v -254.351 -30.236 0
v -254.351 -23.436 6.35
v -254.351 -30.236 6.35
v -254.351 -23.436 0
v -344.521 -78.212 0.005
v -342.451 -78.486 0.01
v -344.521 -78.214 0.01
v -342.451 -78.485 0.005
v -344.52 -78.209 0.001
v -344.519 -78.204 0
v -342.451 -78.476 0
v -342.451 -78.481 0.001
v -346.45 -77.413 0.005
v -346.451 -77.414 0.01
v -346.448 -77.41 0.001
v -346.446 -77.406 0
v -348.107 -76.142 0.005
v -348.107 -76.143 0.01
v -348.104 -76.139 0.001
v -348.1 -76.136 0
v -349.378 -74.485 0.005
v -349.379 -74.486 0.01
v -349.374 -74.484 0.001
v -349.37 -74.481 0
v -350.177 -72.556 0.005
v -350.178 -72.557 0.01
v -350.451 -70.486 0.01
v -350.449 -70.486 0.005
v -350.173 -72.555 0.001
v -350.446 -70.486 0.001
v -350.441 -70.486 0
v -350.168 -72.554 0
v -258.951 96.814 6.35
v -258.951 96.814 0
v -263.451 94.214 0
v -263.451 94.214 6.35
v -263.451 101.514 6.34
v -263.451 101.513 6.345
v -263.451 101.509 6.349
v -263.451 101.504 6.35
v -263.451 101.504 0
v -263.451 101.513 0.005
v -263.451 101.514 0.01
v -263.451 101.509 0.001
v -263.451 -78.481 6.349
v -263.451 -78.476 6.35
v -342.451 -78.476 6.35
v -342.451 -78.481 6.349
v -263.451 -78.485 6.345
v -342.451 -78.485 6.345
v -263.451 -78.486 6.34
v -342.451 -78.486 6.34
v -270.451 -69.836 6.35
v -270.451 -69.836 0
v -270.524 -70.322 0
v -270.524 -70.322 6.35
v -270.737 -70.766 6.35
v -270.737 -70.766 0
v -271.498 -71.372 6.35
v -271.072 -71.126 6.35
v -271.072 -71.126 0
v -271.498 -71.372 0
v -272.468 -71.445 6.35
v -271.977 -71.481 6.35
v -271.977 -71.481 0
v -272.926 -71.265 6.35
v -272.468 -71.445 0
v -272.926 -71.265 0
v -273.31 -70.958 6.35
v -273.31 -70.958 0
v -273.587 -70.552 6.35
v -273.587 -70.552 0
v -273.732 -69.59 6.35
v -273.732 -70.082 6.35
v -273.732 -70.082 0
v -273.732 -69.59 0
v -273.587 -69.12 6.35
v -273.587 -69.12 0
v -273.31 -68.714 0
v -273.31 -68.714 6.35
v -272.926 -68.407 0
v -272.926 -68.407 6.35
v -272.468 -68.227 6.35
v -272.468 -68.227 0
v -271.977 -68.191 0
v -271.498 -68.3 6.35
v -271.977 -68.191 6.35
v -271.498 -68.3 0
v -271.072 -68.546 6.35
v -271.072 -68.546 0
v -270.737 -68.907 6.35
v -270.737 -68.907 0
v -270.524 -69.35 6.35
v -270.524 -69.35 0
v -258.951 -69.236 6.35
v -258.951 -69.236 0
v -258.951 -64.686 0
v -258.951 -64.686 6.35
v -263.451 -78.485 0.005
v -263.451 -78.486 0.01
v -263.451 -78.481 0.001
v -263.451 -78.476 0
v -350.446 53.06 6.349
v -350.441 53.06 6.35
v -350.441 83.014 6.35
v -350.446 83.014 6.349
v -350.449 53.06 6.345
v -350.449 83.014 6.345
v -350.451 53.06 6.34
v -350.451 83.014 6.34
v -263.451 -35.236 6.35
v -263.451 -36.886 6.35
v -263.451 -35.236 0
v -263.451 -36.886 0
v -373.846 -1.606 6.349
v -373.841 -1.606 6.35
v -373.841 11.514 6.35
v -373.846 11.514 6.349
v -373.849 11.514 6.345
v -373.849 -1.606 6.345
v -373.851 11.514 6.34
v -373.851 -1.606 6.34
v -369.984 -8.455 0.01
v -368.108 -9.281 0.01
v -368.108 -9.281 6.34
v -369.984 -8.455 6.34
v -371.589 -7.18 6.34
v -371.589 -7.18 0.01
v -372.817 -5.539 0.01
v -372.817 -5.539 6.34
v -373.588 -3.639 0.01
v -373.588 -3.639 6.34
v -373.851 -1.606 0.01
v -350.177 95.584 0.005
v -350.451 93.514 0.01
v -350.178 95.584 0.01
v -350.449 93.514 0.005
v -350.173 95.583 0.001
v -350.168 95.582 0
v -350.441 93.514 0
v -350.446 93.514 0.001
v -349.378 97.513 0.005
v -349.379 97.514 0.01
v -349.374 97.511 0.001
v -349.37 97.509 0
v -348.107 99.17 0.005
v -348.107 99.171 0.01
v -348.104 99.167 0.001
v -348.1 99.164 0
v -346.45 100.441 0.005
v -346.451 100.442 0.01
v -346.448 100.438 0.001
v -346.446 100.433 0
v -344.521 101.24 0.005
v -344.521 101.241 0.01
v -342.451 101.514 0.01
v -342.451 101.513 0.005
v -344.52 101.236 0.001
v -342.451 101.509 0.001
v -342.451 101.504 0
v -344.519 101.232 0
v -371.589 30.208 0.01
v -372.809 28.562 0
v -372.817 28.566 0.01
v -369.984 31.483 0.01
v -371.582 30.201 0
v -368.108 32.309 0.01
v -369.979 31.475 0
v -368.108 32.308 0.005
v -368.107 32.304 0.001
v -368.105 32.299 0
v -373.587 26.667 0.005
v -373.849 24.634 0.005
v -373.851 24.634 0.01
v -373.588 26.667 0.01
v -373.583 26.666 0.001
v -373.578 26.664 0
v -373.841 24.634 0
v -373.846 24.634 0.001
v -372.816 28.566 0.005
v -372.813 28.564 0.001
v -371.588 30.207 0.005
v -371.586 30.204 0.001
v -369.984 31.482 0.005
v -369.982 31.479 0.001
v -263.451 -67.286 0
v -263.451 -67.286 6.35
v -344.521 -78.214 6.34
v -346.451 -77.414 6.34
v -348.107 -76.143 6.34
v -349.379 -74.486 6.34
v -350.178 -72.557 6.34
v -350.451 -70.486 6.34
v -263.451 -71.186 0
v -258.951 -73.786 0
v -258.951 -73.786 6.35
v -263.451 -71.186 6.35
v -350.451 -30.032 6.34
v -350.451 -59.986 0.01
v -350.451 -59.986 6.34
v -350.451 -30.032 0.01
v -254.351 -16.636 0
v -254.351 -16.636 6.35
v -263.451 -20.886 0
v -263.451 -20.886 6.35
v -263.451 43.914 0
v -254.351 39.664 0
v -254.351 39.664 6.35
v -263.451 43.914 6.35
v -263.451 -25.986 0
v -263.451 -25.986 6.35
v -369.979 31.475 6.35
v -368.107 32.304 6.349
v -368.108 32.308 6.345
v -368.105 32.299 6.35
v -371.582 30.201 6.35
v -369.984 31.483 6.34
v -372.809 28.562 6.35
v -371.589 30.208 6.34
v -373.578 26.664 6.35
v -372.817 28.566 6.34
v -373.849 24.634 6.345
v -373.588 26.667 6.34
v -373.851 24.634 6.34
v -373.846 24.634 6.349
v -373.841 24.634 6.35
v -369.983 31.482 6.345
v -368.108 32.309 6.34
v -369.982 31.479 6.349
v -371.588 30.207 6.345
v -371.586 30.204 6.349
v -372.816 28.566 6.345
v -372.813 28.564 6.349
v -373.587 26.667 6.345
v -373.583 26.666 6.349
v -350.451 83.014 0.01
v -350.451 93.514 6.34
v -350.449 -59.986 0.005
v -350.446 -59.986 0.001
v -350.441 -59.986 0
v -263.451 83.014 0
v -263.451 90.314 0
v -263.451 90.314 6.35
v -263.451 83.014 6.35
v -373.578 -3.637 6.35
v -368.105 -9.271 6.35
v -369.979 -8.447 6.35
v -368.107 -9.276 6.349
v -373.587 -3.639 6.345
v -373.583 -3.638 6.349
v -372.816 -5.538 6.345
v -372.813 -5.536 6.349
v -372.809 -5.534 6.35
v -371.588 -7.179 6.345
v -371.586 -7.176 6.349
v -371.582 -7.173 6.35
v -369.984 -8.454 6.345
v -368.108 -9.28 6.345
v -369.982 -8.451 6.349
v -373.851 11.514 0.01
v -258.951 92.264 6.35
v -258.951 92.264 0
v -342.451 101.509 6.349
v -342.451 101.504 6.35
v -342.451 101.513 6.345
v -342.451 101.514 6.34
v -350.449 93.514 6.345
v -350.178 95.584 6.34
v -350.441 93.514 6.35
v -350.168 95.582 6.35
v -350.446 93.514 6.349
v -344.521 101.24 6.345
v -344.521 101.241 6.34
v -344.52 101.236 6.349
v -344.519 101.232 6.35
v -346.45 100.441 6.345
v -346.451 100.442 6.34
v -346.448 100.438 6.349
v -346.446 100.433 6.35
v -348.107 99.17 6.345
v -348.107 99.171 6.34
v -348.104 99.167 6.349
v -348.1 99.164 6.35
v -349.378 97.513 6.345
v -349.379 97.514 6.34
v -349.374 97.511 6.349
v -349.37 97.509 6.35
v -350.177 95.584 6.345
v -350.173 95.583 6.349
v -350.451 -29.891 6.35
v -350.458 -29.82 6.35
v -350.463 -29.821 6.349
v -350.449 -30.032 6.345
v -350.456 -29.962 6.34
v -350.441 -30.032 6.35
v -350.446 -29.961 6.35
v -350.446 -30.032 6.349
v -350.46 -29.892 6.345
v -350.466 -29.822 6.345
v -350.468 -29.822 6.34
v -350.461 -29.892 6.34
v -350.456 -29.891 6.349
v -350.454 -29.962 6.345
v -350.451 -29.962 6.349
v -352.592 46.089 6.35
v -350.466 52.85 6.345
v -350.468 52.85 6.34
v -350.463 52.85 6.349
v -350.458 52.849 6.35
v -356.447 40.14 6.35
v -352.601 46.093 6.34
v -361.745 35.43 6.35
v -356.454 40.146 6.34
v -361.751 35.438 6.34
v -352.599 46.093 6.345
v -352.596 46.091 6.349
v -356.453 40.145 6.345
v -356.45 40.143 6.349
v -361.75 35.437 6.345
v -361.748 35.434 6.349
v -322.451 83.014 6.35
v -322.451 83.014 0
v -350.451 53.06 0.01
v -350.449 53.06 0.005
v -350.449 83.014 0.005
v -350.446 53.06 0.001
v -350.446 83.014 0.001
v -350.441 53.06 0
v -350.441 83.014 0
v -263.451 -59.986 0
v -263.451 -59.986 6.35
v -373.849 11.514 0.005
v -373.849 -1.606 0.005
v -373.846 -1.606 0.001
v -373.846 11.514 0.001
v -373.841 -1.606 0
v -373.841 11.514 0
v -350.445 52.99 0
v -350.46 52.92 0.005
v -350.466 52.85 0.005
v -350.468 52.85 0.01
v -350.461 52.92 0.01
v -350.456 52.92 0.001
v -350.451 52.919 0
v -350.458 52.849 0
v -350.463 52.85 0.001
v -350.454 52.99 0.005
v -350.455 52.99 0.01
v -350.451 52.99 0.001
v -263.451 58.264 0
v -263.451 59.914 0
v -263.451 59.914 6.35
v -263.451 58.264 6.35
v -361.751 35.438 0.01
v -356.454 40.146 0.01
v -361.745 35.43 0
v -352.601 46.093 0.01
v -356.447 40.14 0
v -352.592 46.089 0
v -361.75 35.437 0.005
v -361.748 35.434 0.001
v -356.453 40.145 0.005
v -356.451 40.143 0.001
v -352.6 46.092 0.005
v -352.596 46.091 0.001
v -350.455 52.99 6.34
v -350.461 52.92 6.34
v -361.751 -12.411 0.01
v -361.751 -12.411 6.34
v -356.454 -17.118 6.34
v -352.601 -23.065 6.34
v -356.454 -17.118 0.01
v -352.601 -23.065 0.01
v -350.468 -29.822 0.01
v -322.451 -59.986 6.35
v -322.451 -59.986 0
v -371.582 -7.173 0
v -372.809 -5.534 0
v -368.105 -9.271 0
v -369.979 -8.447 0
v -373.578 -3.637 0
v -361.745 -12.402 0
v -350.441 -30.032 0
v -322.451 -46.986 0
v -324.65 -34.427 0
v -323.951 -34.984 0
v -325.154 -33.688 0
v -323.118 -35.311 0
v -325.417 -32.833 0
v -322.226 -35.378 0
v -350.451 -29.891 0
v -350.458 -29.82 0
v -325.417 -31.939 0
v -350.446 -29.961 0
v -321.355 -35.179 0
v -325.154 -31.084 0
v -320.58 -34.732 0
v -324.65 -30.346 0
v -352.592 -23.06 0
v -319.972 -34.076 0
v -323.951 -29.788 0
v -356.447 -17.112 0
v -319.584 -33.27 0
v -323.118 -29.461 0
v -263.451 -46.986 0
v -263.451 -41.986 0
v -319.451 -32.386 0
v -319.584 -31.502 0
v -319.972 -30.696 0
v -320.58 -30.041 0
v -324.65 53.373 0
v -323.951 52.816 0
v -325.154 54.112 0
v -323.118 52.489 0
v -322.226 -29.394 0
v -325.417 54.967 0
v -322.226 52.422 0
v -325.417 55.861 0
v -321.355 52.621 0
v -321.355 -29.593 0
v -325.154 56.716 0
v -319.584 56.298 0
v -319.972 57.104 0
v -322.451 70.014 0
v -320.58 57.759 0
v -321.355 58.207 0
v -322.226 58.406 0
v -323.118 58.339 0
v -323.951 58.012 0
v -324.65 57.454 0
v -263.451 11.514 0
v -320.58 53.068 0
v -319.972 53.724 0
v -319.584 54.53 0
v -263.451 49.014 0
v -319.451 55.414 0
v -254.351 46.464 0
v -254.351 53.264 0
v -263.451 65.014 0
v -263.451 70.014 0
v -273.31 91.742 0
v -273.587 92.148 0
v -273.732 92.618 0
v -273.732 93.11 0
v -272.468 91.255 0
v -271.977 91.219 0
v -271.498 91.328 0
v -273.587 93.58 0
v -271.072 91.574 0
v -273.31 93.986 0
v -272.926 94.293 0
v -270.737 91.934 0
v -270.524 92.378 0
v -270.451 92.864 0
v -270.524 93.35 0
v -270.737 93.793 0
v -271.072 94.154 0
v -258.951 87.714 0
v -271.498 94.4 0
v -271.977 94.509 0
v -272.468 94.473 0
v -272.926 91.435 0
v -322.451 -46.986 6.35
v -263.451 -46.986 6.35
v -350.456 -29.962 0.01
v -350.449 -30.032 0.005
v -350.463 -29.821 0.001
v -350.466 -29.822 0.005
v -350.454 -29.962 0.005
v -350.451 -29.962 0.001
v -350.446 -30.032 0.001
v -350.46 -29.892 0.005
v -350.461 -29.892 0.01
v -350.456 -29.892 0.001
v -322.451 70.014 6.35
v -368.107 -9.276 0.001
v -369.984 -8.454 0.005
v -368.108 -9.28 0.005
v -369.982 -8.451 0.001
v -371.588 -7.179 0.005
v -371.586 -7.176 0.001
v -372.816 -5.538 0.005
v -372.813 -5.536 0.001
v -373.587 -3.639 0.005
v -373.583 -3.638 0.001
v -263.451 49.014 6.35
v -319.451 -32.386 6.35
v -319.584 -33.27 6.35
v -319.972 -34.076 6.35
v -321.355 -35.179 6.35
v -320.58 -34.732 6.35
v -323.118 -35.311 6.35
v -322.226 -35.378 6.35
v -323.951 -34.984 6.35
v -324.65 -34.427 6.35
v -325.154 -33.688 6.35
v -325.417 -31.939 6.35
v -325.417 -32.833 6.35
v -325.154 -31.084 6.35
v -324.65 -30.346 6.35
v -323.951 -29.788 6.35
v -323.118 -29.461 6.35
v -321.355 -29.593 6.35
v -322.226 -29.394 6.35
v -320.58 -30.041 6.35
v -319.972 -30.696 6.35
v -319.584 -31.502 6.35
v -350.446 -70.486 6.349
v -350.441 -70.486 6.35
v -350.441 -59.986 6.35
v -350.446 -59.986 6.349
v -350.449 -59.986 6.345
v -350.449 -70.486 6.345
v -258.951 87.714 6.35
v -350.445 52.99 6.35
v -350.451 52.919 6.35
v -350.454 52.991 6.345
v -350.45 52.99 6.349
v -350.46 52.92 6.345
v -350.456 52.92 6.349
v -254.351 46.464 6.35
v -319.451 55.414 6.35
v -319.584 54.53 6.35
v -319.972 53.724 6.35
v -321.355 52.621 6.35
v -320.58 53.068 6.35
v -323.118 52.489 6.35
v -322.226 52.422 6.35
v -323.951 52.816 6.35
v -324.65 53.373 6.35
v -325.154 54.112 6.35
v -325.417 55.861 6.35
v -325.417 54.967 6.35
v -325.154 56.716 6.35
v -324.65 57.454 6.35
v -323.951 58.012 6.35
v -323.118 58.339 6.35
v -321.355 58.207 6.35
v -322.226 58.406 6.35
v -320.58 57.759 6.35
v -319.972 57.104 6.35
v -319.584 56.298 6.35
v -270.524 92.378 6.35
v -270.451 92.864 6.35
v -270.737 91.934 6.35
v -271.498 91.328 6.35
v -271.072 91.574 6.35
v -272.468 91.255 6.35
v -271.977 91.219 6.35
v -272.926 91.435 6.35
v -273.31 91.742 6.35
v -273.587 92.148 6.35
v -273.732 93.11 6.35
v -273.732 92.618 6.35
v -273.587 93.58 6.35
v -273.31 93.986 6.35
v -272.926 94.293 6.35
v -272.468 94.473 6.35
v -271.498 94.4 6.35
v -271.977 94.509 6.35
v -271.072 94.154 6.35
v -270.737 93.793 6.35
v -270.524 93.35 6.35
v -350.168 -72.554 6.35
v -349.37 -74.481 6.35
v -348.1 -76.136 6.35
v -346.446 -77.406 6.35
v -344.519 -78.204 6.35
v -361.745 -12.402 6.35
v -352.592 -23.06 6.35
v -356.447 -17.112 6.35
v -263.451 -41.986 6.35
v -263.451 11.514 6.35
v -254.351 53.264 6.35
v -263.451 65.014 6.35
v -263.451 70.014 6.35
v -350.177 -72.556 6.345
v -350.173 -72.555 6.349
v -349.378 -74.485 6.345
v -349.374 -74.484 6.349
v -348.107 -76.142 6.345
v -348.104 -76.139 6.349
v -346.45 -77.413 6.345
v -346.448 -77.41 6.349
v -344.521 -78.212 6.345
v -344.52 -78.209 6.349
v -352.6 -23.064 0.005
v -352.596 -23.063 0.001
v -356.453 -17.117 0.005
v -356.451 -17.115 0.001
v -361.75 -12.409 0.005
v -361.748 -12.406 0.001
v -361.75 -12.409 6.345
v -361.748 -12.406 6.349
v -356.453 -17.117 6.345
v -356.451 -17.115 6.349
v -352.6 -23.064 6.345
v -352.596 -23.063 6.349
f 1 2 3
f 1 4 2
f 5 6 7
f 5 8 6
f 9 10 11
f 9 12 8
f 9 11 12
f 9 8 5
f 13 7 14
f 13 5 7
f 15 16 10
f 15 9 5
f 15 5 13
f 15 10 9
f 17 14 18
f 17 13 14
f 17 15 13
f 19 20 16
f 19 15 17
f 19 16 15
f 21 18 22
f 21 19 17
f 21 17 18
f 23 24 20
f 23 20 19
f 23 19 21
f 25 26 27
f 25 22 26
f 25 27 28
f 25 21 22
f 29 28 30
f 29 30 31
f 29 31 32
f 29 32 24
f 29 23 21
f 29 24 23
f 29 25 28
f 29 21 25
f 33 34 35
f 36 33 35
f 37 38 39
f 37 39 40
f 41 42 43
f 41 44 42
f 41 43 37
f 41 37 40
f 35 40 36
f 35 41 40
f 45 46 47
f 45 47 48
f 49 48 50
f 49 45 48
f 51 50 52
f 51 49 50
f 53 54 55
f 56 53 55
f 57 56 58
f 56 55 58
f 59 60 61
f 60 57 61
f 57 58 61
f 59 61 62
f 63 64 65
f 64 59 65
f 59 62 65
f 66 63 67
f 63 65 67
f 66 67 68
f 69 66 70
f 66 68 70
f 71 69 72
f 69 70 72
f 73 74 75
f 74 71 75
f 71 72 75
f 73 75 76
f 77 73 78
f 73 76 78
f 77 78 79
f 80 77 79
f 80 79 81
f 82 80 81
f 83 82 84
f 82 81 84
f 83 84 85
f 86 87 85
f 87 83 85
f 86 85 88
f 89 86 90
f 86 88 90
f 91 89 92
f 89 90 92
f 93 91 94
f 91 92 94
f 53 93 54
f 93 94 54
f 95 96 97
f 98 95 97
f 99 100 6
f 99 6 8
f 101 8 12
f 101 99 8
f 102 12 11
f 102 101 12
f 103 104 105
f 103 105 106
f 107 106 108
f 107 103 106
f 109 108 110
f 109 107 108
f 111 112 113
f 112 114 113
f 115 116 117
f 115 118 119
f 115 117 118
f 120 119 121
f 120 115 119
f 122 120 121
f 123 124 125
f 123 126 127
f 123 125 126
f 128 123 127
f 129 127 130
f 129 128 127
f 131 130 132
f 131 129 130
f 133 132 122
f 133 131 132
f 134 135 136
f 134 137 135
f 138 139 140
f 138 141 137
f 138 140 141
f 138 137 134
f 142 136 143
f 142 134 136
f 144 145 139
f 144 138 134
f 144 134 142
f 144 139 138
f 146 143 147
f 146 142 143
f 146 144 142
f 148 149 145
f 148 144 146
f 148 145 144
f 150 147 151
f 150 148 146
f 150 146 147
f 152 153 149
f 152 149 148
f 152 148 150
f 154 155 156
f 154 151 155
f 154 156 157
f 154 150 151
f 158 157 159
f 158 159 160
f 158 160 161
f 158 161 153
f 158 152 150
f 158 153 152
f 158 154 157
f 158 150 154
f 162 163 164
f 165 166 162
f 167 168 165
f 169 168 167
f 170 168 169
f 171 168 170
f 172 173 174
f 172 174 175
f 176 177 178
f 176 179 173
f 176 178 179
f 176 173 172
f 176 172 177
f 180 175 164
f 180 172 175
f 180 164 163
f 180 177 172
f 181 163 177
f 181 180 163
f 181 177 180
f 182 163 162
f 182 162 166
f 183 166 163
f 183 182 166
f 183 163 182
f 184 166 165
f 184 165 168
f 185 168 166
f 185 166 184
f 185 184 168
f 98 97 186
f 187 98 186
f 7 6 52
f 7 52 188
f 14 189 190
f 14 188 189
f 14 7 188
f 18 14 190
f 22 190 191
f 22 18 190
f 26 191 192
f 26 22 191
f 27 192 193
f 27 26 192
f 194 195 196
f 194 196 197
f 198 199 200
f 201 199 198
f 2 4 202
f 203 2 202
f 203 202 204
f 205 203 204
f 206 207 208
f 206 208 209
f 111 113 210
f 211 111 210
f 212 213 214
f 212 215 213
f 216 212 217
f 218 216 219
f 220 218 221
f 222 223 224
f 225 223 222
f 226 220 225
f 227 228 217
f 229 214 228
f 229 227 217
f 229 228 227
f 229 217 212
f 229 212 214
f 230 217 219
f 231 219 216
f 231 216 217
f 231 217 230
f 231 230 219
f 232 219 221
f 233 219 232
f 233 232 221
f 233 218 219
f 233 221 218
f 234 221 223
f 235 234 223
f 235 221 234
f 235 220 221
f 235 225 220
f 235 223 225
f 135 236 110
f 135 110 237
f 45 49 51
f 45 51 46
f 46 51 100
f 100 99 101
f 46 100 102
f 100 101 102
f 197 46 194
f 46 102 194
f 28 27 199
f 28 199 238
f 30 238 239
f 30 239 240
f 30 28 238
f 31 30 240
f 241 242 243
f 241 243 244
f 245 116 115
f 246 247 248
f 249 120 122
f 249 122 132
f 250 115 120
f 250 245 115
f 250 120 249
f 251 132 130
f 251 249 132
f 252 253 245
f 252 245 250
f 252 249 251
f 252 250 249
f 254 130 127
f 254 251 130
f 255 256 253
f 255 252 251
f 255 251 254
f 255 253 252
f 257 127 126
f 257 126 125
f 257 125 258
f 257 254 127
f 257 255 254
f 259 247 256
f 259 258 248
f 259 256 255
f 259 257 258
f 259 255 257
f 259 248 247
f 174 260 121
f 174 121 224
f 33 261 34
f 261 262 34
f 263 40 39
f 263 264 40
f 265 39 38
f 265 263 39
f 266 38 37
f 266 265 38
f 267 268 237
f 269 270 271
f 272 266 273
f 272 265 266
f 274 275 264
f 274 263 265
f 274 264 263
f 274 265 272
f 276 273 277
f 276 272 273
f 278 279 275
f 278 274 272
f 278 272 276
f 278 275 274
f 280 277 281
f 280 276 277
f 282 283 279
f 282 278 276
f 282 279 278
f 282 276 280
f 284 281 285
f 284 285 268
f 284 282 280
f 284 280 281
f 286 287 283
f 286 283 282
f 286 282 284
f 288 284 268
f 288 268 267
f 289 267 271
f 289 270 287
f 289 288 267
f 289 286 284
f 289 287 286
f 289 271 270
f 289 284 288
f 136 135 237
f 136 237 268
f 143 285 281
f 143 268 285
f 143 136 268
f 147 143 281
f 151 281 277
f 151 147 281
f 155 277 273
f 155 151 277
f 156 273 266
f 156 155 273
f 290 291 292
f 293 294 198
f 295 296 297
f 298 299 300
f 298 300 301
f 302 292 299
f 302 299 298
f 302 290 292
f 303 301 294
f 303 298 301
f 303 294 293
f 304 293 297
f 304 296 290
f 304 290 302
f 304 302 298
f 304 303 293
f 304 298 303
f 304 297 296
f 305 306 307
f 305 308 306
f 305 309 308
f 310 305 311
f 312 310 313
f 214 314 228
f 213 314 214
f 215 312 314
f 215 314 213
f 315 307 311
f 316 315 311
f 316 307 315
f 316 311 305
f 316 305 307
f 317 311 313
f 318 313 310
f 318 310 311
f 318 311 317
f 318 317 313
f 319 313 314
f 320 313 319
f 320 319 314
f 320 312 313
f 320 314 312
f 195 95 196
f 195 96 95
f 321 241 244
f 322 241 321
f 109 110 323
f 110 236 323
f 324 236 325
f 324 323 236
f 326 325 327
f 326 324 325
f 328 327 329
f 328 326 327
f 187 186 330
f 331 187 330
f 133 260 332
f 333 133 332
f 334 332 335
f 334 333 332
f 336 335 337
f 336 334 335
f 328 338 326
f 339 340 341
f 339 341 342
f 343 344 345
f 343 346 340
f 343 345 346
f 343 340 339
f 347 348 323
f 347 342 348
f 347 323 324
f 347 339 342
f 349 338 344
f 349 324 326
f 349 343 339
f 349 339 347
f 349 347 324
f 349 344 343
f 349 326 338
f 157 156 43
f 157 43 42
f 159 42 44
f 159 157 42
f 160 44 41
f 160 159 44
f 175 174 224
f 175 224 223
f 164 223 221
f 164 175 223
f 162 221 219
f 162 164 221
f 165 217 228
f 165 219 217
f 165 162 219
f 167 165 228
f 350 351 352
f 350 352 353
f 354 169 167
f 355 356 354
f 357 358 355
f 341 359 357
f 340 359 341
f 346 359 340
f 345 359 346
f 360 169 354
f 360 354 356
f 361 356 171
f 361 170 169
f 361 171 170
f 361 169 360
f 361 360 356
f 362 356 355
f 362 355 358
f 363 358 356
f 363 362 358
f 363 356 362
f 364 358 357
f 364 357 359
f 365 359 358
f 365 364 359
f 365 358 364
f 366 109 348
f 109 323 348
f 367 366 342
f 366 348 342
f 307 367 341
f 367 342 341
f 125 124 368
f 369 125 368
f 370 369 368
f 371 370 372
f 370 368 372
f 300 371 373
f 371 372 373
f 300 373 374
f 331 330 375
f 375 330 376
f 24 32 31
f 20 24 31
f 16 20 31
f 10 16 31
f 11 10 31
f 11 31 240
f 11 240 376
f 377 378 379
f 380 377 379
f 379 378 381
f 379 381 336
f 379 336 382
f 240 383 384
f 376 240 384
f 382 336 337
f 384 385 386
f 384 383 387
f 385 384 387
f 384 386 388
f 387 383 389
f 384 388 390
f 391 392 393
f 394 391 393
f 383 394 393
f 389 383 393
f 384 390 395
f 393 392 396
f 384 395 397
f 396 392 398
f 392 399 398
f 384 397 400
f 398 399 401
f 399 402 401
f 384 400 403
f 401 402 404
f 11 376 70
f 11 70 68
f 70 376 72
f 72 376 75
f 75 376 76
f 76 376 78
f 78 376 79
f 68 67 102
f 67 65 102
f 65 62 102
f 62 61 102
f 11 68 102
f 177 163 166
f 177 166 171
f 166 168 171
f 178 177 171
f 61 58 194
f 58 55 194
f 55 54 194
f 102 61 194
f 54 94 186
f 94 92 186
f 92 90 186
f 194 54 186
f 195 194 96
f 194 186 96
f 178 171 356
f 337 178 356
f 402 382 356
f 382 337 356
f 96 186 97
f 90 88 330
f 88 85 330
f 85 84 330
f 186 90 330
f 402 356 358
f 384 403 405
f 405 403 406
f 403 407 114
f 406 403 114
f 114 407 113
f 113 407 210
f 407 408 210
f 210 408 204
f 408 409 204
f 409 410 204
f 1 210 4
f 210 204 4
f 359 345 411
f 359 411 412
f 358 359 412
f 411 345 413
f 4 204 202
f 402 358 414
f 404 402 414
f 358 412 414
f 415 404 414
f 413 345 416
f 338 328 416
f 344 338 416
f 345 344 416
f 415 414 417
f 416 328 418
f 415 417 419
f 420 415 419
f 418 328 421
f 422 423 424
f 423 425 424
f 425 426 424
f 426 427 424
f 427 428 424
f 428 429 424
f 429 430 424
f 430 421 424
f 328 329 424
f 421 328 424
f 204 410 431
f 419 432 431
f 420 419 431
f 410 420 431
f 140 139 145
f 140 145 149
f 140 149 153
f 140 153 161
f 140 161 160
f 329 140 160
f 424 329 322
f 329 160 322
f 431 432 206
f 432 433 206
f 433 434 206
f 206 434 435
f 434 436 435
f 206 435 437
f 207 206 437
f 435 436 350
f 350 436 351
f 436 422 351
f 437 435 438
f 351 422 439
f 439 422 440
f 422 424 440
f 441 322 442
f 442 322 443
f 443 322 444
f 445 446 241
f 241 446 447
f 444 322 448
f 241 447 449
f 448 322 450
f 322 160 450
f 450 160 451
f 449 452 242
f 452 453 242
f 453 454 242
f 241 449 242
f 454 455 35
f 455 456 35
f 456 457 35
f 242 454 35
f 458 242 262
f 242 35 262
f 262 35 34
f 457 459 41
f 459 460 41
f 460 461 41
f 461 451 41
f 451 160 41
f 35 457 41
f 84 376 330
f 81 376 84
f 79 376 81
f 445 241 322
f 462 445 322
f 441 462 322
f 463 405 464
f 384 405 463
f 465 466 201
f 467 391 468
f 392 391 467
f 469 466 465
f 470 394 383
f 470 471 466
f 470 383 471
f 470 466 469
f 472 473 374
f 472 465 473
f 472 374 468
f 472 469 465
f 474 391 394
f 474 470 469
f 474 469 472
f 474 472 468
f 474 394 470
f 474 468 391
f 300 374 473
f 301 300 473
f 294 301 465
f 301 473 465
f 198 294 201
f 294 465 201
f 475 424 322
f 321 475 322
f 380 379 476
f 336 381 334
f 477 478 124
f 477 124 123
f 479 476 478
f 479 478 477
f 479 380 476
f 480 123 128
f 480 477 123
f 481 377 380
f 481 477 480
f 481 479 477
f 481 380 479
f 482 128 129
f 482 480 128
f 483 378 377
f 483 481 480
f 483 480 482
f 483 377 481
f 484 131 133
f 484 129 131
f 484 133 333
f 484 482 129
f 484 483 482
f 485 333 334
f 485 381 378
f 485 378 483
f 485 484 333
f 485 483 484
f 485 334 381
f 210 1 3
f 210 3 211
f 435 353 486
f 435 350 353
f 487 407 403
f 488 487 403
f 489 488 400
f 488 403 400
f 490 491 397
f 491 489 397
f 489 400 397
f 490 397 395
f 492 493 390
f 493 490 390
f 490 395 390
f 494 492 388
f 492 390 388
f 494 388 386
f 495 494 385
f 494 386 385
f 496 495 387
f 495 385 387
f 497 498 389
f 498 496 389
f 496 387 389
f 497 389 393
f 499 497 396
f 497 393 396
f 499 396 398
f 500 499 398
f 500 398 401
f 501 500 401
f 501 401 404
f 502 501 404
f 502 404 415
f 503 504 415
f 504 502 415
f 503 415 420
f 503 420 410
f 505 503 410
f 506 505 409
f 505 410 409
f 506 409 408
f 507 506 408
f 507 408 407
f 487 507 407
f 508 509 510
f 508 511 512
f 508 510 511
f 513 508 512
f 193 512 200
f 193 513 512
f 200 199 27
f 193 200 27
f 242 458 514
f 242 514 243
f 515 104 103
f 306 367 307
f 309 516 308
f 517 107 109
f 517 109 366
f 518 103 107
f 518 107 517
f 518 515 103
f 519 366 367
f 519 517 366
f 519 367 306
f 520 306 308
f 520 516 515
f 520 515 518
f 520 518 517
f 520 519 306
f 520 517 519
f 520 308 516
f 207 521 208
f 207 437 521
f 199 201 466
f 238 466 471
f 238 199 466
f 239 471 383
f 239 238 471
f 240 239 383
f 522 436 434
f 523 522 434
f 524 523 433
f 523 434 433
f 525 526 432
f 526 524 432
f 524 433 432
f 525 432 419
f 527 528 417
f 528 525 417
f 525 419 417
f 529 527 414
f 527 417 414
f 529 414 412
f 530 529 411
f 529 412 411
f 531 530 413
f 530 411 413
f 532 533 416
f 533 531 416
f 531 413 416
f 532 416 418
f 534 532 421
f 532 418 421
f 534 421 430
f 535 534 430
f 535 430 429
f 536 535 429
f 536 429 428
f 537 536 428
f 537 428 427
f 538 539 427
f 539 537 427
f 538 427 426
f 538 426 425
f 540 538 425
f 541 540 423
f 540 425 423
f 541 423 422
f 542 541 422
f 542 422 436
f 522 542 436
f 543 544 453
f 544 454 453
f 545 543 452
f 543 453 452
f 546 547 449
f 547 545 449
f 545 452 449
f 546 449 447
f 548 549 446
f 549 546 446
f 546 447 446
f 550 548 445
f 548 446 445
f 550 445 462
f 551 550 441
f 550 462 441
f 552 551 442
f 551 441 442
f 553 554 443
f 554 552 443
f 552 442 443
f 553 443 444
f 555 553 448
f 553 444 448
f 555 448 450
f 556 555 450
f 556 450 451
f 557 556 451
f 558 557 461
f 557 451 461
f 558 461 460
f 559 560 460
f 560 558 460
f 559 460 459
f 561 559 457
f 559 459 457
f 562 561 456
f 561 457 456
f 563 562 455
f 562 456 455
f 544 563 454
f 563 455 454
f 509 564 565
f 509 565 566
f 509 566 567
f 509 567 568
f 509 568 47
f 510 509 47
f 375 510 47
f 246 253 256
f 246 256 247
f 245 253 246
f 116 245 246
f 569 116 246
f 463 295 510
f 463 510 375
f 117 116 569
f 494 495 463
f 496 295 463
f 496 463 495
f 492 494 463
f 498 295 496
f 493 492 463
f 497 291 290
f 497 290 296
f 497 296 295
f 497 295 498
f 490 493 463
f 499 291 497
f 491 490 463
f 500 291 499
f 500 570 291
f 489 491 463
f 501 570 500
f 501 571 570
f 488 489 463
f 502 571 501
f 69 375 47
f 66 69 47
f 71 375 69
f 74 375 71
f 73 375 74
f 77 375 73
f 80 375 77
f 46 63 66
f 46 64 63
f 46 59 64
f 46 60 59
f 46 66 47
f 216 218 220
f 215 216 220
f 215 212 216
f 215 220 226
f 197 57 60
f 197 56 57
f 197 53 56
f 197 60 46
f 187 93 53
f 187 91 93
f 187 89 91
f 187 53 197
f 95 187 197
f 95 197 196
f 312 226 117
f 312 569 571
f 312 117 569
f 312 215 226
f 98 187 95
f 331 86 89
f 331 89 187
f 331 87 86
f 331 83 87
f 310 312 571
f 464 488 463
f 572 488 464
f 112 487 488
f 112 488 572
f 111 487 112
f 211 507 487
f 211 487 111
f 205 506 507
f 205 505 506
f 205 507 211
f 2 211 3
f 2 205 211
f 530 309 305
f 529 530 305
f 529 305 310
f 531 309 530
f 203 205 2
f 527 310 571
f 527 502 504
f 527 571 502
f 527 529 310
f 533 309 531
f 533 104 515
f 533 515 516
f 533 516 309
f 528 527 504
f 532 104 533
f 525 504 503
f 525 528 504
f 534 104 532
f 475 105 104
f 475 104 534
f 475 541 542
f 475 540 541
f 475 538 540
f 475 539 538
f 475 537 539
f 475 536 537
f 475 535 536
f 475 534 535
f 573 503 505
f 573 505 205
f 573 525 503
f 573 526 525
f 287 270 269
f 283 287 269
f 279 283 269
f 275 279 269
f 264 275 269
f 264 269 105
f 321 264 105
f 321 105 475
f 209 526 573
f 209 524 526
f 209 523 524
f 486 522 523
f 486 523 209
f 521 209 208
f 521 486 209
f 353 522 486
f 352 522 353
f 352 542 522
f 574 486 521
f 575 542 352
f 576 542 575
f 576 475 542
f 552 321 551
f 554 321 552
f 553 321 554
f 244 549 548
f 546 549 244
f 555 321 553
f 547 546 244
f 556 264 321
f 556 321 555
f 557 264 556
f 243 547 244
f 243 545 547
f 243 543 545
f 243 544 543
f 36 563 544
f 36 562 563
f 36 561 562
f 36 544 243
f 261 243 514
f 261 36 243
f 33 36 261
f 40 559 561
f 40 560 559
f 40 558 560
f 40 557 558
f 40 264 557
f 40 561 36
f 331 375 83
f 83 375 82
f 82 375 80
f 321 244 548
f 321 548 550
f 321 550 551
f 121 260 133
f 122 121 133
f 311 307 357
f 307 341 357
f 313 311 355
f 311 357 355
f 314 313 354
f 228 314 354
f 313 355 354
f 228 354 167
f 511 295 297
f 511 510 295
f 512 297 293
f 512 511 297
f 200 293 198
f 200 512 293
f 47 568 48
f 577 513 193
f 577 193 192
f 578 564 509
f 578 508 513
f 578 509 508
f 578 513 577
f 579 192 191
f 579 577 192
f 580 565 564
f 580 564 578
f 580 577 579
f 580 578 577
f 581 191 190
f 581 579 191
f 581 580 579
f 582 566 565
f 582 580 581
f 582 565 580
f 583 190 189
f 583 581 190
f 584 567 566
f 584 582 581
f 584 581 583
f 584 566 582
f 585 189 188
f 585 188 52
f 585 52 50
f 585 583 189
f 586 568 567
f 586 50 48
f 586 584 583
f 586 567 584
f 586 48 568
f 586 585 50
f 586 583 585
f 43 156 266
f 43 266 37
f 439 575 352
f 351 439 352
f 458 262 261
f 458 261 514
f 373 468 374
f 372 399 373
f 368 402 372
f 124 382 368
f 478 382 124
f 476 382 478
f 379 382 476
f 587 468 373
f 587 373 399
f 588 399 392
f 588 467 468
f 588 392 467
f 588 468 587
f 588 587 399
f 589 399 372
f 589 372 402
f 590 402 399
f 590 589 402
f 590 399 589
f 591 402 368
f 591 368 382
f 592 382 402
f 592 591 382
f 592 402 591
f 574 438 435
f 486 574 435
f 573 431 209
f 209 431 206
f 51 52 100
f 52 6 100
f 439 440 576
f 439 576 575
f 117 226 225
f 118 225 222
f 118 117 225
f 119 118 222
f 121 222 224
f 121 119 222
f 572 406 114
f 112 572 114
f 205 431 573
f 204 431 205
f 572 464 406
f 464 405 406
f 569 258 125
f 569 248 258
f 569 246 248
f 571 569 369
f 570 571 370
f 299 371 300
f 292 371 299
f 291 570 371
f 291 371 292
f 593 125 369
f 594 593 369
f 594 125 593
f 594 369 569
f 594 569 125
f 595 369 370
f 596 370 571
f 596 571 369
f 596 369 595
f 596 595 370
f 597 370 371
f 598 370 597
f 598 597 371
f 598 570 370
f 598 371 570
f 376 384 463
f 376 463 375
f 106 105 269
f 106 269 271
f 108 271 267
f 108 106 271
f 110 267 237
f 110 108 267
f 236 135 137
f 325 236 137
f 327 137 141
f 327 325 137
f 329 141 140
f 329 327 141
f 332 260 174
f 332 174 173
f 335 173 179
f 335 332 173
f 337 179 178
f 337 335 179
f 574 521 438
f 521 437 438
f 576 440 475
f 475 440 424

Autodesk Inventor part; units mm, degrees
ref_plane "YZ Plane" through (0, 0, 0) normal (1, 0, 0) x (0, 1, 0)
ref_plane "XZ Plane" through (0, 0, 0) normal (0, 1, 0) x (-1, 0, 0)
ref_plane "XY Plane" through (0, 0, 0) normal (0, 0, 1) x (1, 0, 0)
sketch "Boceto1" plane through (0, 0, 0) normal (0, 0, 1) x (1, 0, 0)
  line L0 (0, 71.5) -> (84.4, 71.5)
  line L1 (0, 0) -> (4.5, 0)
  line L2 (62.2, 0) -> (62.2, 35)
  line L3 (62.2, 35) -> (112.2, 35)
  line L4 (112.2, 35) -> (112.2, 0)
  line L5 (84.4, 58.5) -> (84.4, 71.5)
  line L6 (84.4, 58.5) -> (0, 58.5)
  line L7 (87.2, 35) -> (108.2, 35)
  circle A0 centre (108.2, 46.75) radius 1.65
  circle A1 centre (66.2, 46.75) radius 1.65
  circle A2 centre (31.1, 43.75) radius 3
  circle A3 centre (178.7, 0) radius 2.5
  circle A4 centre (68.5, 81.35) radius 1.65
  line L8 (0, 90) -> (105.7, 90)
  arc A5 (120.7782, 83.1308) -> (105.7, 90) centre (105.672, 69.9553) ccw
  line L9 (200, 0) -> (200, 30.4)
  arc A6 (200, 30.4) -> (192, 38.4) centre (192, 30.4) ccw
  arc A7 (120.7782, 83.1308) -> (192, 38.4) centre (202.3119, 133.8853) ccw
  line L10 (4.5, 80.75) -> (4.5, 85.3)
  line L11 (4.5, 85.3) -> (0, 82.7)
  line L12 (4.5, 80.75) -> (4.5, 76.2)
  line L13 (4.5, 76.2) -> (0, 78.8)
  line L14 (0, 90) -> (0, 82.7)
  line L15 (0, 58.5) -> (0, 53.5)
  line L16 (0, 48.4) -> (0, 46.75)
  line L17 (0, 78.8) -> (0, 71.5)
  line L18 (0, 58.5) -> (0, 53.5)
  line L19 (0, 53.5) -> (0, 48.4)
  line L20 (0, 58.5) -> (0, 37.5)
  line L21 (9.1, 34.95) -> (9.1, 41.75)
  line L22 (9.1, 41.75) -> (0, 37.5)
  line L23 (9.1, 34.95) -> (9.1, 28.15)
  line L24 (9.1, 28.15) -> (0, 32.4)
  line L25 (0, 0) -> (0, 32.4)
  line L26 (0, 37.5) -> (0, 46.75)
  line L27 (0, -71.5) -> (84.4, -71.5)
  line L28 (62.2, 0) -> (62.2, -35)
  line L29 (62.2, -35) -> (112.2, -35)
  line L30 (112.2, -35) -> (112.2, 0)
  line L31 (84.4, -58.5) -> (84.4, -71.5)
  line L32 (84.4, -58.5) -> (0, -58.5)
  line L33 (87.2, -35) -> (108.2, -35)
  circle A8 centre (108.2, -46.75) radius 1.65
  circle A9 centre (66.2, -46.75) radius 1.65
  circle A10 centre (31.1, -43.75) radius 3
  circle A11 centre (178.7, 0) radius 2.5
  circle A12 centre (68.5, -81.35) radius 1.65
  line L34 (0, -90) -> (105.7, -90)
  arc A13 (105.7, -90) -> (120.7782, -83.1308) centre (105.672, -69.9553) ccw
  line L35 (200, 0) -> (200, -30.4)
  arc A14 (192, -38.4) -> (200, -30.4) centre (192, -30.4) ccw
  arc A15 (192, -38.4) -> (120.7782, -83.1308) centre (202.3119, -133.8853) ccw
  line L36 (4.5, -80.75) -> (4.5, -85.3)
  line L37 (4.5, -85.3) -> (0, -82.7)
  line L38 (4.5, -80.75) -> (4.5, -76.2)
  line L39 (4.5, -76.2) -> (0, -78.8)
  line L40 (0, -90) -> (0, -82.7)
  line L41 (0, -58.5) -> (0, -53.5)
  line L42 (0, -48.4) -> (0, -46.75)
  line L43 (0, -78.8) -> (0, -71.5)
  line L44 (0, -58.5) -> (0, -53.5)
  line L45 (0, -53.5) -> (0, -48.4)
  line L46 (0, -58.5) -> (0, -37.5)
  line L47 (9.1, -34.95) -> (9.1, -41.75)
  line L48 (9.1, -41.75) -> (0, -37.5)
  line L49 (9.1, -34.95) -> (9.1, -28.15)
  line L50 (9.1, -28.15) -> (0, -32.4)
  line L51 (0, 0) -> (0, -32.4)
  line L52 (0, -37.5) -> (0, -46.75)
  line L53 (261.8168, 58.5) -> (321.3628, 58.5)
  line L54 (321.3628, 58.5) -> (321.3628, -17.5)
  line L55 (321.3628, -17.5) -> (261.8168, -17.5)
  line L56 (261.8168, -17.5) -> (261.8168, 58.5)
sketch "Boceto3" plane through (0, 0, 0) normal (0, 0, 1) x (1, 0, 0)
  line L0 (-258.9506, 92.2639) -> (-258.9506, 96.8139)
  line L1 (-258.9506, 96.8139) -> (-263.4506, 94.2139)
  line L2 (-258.9506, 92.2639) -> (-258.9506, 87.7139)
  line L3 (-258.9506, 87.7139) -> (-263.4506, 90.3139)
  line L4 (-263.4506, 101.5139) -> (-263.4506, 94.2139)
  line L5 (-263.4506, 70.0139) -> (-263.4506, 65.0139)
  line L6 (-263.4506, 59.9139) -> (-263.4506, 58.2639)
  line L7 (-263.4506, 90.3139) -> (-263.4506, 83.0139)
  line L8 (-263.4506, 70.0139) -> (-263.4506, 65.0139)
  line L9 (-263.4506, 65.0139) -> (-263.4506, 59.9139)
  line L10 (-263.4506, 70.0139) -> (-263.4506, 49.0139)
  line L11 (-254.3506, 46.4639) -> (-254.3506, 53.2639)
  line L12 (-254.3506, 53.2639) -> (-263.4506, 49.0139)
  line L13 (-254.3506, 46.4639) -> (-254.3506, 39.6639)
  line L14 (-254.3506, 39.6639) -> (-263.4506, 43.9139)
  line L15 (-263.4506, 11.5139) -> (-263.4506, 43.9139)
  line L16 (-263.4506, 49.0139) -> (-263.4506, 58.2639)
  line L17 (-263.4506, 83.0139) -> (-322.4506, 83.0139)
  line L18 (-263.4506, 83.0139) -> (-322.4506, 83.0139)
  line L19 (-263.4506, 70.0139) -> (-322.4506, 70.0139)
  line L20 (-322.4506, 70.0139) -> (-322.4506, 83.0139)
  circle A0 centre (-322.4506, 55.4139) radius 3
  line L21 (-350.4506, 83.0139) -> (-350.4506, 93.5139)
  circle A1 centre (-272.1006, 92.8639) radius 1.65
  line L22 (-342.4506, 101.5139) -> (-263.4506, 101.5139)
  line L23 (-373.8506, 11.5139) -> (-373.8506, 24.6339)
  arc A2 (-368.1081, 32.3088) -> (-373.8506, 24.6339) centre (-365.8506, 24.6339) ccw
  arc A3 (-342.4506, 101.5139) -> (-350.4506, 93.5139) centre (-342.4506, 93.5139) ccw
  arc A4 (-368.1081, 32.3088) -> (-350.4675, 52.85) centre (-376.4854, 57.3485) ccw
  line L24 (-350.4506, 83.0139) -> (-350.4506, 53.0604)
  arc A5 (-350.4675, 52.85) -> (-350.4506, 53.0604) centre (-357.2375, 53.5013) ccw
  line L25 (-258.9506, -69.2361) -> (-258.9506, -73.7861)
  line L26 (-258.9506, -73.7861) -> (-263.4506, -71.1861)
  line L27 (-258.9506, -69.2361) -> (-258.9506, -64.6861)
  line L28 (-258.9506, -64.6861) -> (-263.4506, -67.2861)
  line L29 (-263.4506, -78.4861) -> (-263.4506, -71.1861)
  line L30 (-263.4506, -46.9861) -> (-263.4506, -41.9861)
  line L31 (-263.4506, -36.8861) -> (-263.4506, -35.2361)
  line L32 (-263.4506, -67.2861) -> (-263.4506, -59.9861)
  line L33 (-263.4506, -46.9861) -> (-263.4506, -41.9861)
  line L34 (-263.4506, -41.9861) -> (-263.4506, -36.8861)
  line L35 (-263.4506, -46.9861) -> (-263.4506, -25.9861)
  line L36 (-254.3506, -23.4361) -> (-254.3506, -30.2361)
  line L37 (-254.3506, -30.2361) -> (-263.4506, -25.9861)
  line L38 (-254.3506, -23.4361) -> (-254.3506, -16.6361)
  line L39 (-254.3506, -16.6361) -> (-263.4506, -20.8861)
  line L40 (-263.4506, 11.5139) -> (-263.4506, -20.8861)
  line L41 (-263.4506, -25.9861) -> (-263.4506, -35.2361)
  line L42 (-263.4506, -59.9861) -> (-322.4506, -59.9861)
  line L43 (-263.4506, -59.9861) -> (-322.4506, -59.9861)
  line L44 (-263.4506, -46.9861) -> (-322.4506, -46.9861)
  line L45 (-322.4506, -46.9861) -> (-322.4506, -59.9861)
  circle A6 centre (-322.4506, -32.3861) radius 3
  line L46 (-350.4506, -59.9861) -> (-350.4506, -70.4861)
  circle A7 centre (-272.1006, -69.8361) radius 1.65
  line L47 (-342.4506, -78.4861) -> (-263.4506, -78.4861)
  line L48 (-373.8506, 11.5139) -> (-373.8506, -1.6061)
  arc A8 (-373.8506, -1.6061) -> (-368.1081, -9.2809) centre (-365.8506, -1.6061) ccw
  arc A9 (-350.4506, -70.4861) -> (-342.4506, -78.4861) centre (-342.4506, -70.4861) ccw
  arc A10 (-350.4675, -29.8221) -> (-368.1081, -9.2809) centre (-376.4854, -34.3207) ccw
  line L49 (-350.4506, -59.9861) -> (-350.4506, -30.0325)
  arc A11 (-350.4506, -30.0325) -> (-350.4675, -29.8221) centre (-357.2375, -30.4734) ccw
  point P0 (0, 0)
sketch "Boceto4" plane through (0, 0, 0) normal (0, 0, 1) x (1, 0, 0)
  line L0 (-279.0503, -82.5554) -> (-279.0503, -78.0054)
  line L1 (-279.0503, -78.0054) -> (-283.5503, -80.6054)
  line L2 (-279.0503, -82.5554) -> (-279.0503, -87.1054)
  line L3 (-279.0503, -87.1054) -> (-283.5503, -84.5054)
  line L4 (-283.5503, -73.3054) -> (-283.5503, -80.6054)
  line L5 (-283.5503, -104.8054) -> (-283.5503, -109.8054)
  line L6 (-283.5503, -114.9054) -> (-283.5503, -116.5554)
  line L7 (-283.5503, -84.5054) -> (-283.5503, -91.8054)
  line L8 (-283.5503, -104.8054) -> (-283.5503, -109.8054)
  line L9 (-283.5503, -109.8054) -> (-283.5503, -114.9054)
  line L10 (-283.5503, -104.8054) -> (-283.5503, -125.8054)
  line L11 (-274.4503, -128.3554) -> (-274.4503, -121.5554)
  line L12 (-274.4503, -121.5554) -> (-283.5503, -125.8054)
  line L13 (-274.4503, -128.3554) -> (-274.4503, -135.1554)
  line L14 (-274.4503, -135.1554) -> (-283.5503, -130.9054)
  line L15 (-283.5503, -163.3054) -> (-283.5503, -130.9054)
  line L16 (-283.5503, -125.8054) -> (-283.5503, -116.5554)
  line L17 (-393.9503, -163.3054) -> (-283.5503, -163.3054)
  line L18 (-283.5503, -91.8054) -> (-342.5503, -91.8054)
  line L19 (-283.5503, -91.8054) -> (-342.5503, -91.8054)
  line L20 (-283.5503, -104.8054) -> (-342.5503, -104.8054)
  line L21 (-342.5503, -104.8054) -> (-342.5503, -91.8054)
  circle A0 centre (-342.5503, -119.4054) radius 3
  line L22 (-370.5503, -91.8054) -> (-370.5503, -81.3054)
  circle A1 centre (-292.2003, -81.9554) radius 1.65
  line L23 (-362.5503, -73.3054) -> (-283.5503, -73.3054)
  line L24 (-393.9503, -163.3054) -> (-393.9503, -150.1854)
  arc A2 (-388.2078, -142.5105) -> (-393.9503, -150.1854) centre (-385.9503, -150.1854) ccw
  arc A3 (-362.5503, -73.3054) -> (-370.5503, -81.3054) centre (-362.5503, -81.3054) ccw
  arc A4 (-388.2078, -142.5105) -> (-370.5672, -121.9694) centre (-396.5851, -117.4708) ccw
  line L25 (-370.5503, -91.8054) -> (-370.5503, -121.7589)
  arc A5 (-370.5672, -121.9694) -> (-370.5503, -121.7589) centre (-377.3372, -121.318) ccw
  point P0 (0, 0)
  point P1 (89.2704, -12.3046)
  dimension "d61" = 13.12
  dimension "d62" = 8
extrude "Extrusión2" add sketch "Boceto3" along normal blind 6.35
fillet "Empalme3" radius 0.01 22 edges at (-348.1074, 99.1708, 6.35) (-350.4506, 88.2639, 6.35) (-302.9506, 101.5139, 6.35) (-356.4543, 40.1461, 6.35) (-373.8506, 18.0739, 6.35) (-372.256, -6.3988, 6.35) (-372.256, 29.4266, 6.35) (-356.4543, -17.1182, 6.35) (-348.1074, -76.1429, 6.35) (-302.9506, -78.4861, 6.35) (-350.4506, -45.0093, 6.35) (-348.1074, 99.1708, 0) (-350.4506, 88.2639, 0) (-302.9506, 101.5139, 0) (-356.4543, 40.1461, 0) (-373.8506, 18.0739, 0) (-372.256, -6.3988, 0) (-372.256, 29.4266, 0) (-356.4543, -17.1182, 0) (-348.1074, -76.1429, 0) (-302.9506, -78.4861, 0) (-350.4506, -45.0093, 0)
equation "\"Radio_pliegue\" = Grosor"
equation "\"Anchura_desahogo_plegado\" = Grosor"
equation "\"Profundidad_desahogo_plegado\" = 0.5 * Grosor"
equation "\"Tamaño_destalonado\" = 4 * Grosor"
equation "\"Remanente_mínimo\" = 2 * Grosor"
equation "\"Radiodetransición\" = Radio_pliegue"
equation "\"Tamaño_de_radio_de_Jacobi\" = Radio_pliegue"
equation "\"TamañoSeparación\" = Grosor"
equation "\"Grosor\" = 0.5"
properties part number "tmr"
